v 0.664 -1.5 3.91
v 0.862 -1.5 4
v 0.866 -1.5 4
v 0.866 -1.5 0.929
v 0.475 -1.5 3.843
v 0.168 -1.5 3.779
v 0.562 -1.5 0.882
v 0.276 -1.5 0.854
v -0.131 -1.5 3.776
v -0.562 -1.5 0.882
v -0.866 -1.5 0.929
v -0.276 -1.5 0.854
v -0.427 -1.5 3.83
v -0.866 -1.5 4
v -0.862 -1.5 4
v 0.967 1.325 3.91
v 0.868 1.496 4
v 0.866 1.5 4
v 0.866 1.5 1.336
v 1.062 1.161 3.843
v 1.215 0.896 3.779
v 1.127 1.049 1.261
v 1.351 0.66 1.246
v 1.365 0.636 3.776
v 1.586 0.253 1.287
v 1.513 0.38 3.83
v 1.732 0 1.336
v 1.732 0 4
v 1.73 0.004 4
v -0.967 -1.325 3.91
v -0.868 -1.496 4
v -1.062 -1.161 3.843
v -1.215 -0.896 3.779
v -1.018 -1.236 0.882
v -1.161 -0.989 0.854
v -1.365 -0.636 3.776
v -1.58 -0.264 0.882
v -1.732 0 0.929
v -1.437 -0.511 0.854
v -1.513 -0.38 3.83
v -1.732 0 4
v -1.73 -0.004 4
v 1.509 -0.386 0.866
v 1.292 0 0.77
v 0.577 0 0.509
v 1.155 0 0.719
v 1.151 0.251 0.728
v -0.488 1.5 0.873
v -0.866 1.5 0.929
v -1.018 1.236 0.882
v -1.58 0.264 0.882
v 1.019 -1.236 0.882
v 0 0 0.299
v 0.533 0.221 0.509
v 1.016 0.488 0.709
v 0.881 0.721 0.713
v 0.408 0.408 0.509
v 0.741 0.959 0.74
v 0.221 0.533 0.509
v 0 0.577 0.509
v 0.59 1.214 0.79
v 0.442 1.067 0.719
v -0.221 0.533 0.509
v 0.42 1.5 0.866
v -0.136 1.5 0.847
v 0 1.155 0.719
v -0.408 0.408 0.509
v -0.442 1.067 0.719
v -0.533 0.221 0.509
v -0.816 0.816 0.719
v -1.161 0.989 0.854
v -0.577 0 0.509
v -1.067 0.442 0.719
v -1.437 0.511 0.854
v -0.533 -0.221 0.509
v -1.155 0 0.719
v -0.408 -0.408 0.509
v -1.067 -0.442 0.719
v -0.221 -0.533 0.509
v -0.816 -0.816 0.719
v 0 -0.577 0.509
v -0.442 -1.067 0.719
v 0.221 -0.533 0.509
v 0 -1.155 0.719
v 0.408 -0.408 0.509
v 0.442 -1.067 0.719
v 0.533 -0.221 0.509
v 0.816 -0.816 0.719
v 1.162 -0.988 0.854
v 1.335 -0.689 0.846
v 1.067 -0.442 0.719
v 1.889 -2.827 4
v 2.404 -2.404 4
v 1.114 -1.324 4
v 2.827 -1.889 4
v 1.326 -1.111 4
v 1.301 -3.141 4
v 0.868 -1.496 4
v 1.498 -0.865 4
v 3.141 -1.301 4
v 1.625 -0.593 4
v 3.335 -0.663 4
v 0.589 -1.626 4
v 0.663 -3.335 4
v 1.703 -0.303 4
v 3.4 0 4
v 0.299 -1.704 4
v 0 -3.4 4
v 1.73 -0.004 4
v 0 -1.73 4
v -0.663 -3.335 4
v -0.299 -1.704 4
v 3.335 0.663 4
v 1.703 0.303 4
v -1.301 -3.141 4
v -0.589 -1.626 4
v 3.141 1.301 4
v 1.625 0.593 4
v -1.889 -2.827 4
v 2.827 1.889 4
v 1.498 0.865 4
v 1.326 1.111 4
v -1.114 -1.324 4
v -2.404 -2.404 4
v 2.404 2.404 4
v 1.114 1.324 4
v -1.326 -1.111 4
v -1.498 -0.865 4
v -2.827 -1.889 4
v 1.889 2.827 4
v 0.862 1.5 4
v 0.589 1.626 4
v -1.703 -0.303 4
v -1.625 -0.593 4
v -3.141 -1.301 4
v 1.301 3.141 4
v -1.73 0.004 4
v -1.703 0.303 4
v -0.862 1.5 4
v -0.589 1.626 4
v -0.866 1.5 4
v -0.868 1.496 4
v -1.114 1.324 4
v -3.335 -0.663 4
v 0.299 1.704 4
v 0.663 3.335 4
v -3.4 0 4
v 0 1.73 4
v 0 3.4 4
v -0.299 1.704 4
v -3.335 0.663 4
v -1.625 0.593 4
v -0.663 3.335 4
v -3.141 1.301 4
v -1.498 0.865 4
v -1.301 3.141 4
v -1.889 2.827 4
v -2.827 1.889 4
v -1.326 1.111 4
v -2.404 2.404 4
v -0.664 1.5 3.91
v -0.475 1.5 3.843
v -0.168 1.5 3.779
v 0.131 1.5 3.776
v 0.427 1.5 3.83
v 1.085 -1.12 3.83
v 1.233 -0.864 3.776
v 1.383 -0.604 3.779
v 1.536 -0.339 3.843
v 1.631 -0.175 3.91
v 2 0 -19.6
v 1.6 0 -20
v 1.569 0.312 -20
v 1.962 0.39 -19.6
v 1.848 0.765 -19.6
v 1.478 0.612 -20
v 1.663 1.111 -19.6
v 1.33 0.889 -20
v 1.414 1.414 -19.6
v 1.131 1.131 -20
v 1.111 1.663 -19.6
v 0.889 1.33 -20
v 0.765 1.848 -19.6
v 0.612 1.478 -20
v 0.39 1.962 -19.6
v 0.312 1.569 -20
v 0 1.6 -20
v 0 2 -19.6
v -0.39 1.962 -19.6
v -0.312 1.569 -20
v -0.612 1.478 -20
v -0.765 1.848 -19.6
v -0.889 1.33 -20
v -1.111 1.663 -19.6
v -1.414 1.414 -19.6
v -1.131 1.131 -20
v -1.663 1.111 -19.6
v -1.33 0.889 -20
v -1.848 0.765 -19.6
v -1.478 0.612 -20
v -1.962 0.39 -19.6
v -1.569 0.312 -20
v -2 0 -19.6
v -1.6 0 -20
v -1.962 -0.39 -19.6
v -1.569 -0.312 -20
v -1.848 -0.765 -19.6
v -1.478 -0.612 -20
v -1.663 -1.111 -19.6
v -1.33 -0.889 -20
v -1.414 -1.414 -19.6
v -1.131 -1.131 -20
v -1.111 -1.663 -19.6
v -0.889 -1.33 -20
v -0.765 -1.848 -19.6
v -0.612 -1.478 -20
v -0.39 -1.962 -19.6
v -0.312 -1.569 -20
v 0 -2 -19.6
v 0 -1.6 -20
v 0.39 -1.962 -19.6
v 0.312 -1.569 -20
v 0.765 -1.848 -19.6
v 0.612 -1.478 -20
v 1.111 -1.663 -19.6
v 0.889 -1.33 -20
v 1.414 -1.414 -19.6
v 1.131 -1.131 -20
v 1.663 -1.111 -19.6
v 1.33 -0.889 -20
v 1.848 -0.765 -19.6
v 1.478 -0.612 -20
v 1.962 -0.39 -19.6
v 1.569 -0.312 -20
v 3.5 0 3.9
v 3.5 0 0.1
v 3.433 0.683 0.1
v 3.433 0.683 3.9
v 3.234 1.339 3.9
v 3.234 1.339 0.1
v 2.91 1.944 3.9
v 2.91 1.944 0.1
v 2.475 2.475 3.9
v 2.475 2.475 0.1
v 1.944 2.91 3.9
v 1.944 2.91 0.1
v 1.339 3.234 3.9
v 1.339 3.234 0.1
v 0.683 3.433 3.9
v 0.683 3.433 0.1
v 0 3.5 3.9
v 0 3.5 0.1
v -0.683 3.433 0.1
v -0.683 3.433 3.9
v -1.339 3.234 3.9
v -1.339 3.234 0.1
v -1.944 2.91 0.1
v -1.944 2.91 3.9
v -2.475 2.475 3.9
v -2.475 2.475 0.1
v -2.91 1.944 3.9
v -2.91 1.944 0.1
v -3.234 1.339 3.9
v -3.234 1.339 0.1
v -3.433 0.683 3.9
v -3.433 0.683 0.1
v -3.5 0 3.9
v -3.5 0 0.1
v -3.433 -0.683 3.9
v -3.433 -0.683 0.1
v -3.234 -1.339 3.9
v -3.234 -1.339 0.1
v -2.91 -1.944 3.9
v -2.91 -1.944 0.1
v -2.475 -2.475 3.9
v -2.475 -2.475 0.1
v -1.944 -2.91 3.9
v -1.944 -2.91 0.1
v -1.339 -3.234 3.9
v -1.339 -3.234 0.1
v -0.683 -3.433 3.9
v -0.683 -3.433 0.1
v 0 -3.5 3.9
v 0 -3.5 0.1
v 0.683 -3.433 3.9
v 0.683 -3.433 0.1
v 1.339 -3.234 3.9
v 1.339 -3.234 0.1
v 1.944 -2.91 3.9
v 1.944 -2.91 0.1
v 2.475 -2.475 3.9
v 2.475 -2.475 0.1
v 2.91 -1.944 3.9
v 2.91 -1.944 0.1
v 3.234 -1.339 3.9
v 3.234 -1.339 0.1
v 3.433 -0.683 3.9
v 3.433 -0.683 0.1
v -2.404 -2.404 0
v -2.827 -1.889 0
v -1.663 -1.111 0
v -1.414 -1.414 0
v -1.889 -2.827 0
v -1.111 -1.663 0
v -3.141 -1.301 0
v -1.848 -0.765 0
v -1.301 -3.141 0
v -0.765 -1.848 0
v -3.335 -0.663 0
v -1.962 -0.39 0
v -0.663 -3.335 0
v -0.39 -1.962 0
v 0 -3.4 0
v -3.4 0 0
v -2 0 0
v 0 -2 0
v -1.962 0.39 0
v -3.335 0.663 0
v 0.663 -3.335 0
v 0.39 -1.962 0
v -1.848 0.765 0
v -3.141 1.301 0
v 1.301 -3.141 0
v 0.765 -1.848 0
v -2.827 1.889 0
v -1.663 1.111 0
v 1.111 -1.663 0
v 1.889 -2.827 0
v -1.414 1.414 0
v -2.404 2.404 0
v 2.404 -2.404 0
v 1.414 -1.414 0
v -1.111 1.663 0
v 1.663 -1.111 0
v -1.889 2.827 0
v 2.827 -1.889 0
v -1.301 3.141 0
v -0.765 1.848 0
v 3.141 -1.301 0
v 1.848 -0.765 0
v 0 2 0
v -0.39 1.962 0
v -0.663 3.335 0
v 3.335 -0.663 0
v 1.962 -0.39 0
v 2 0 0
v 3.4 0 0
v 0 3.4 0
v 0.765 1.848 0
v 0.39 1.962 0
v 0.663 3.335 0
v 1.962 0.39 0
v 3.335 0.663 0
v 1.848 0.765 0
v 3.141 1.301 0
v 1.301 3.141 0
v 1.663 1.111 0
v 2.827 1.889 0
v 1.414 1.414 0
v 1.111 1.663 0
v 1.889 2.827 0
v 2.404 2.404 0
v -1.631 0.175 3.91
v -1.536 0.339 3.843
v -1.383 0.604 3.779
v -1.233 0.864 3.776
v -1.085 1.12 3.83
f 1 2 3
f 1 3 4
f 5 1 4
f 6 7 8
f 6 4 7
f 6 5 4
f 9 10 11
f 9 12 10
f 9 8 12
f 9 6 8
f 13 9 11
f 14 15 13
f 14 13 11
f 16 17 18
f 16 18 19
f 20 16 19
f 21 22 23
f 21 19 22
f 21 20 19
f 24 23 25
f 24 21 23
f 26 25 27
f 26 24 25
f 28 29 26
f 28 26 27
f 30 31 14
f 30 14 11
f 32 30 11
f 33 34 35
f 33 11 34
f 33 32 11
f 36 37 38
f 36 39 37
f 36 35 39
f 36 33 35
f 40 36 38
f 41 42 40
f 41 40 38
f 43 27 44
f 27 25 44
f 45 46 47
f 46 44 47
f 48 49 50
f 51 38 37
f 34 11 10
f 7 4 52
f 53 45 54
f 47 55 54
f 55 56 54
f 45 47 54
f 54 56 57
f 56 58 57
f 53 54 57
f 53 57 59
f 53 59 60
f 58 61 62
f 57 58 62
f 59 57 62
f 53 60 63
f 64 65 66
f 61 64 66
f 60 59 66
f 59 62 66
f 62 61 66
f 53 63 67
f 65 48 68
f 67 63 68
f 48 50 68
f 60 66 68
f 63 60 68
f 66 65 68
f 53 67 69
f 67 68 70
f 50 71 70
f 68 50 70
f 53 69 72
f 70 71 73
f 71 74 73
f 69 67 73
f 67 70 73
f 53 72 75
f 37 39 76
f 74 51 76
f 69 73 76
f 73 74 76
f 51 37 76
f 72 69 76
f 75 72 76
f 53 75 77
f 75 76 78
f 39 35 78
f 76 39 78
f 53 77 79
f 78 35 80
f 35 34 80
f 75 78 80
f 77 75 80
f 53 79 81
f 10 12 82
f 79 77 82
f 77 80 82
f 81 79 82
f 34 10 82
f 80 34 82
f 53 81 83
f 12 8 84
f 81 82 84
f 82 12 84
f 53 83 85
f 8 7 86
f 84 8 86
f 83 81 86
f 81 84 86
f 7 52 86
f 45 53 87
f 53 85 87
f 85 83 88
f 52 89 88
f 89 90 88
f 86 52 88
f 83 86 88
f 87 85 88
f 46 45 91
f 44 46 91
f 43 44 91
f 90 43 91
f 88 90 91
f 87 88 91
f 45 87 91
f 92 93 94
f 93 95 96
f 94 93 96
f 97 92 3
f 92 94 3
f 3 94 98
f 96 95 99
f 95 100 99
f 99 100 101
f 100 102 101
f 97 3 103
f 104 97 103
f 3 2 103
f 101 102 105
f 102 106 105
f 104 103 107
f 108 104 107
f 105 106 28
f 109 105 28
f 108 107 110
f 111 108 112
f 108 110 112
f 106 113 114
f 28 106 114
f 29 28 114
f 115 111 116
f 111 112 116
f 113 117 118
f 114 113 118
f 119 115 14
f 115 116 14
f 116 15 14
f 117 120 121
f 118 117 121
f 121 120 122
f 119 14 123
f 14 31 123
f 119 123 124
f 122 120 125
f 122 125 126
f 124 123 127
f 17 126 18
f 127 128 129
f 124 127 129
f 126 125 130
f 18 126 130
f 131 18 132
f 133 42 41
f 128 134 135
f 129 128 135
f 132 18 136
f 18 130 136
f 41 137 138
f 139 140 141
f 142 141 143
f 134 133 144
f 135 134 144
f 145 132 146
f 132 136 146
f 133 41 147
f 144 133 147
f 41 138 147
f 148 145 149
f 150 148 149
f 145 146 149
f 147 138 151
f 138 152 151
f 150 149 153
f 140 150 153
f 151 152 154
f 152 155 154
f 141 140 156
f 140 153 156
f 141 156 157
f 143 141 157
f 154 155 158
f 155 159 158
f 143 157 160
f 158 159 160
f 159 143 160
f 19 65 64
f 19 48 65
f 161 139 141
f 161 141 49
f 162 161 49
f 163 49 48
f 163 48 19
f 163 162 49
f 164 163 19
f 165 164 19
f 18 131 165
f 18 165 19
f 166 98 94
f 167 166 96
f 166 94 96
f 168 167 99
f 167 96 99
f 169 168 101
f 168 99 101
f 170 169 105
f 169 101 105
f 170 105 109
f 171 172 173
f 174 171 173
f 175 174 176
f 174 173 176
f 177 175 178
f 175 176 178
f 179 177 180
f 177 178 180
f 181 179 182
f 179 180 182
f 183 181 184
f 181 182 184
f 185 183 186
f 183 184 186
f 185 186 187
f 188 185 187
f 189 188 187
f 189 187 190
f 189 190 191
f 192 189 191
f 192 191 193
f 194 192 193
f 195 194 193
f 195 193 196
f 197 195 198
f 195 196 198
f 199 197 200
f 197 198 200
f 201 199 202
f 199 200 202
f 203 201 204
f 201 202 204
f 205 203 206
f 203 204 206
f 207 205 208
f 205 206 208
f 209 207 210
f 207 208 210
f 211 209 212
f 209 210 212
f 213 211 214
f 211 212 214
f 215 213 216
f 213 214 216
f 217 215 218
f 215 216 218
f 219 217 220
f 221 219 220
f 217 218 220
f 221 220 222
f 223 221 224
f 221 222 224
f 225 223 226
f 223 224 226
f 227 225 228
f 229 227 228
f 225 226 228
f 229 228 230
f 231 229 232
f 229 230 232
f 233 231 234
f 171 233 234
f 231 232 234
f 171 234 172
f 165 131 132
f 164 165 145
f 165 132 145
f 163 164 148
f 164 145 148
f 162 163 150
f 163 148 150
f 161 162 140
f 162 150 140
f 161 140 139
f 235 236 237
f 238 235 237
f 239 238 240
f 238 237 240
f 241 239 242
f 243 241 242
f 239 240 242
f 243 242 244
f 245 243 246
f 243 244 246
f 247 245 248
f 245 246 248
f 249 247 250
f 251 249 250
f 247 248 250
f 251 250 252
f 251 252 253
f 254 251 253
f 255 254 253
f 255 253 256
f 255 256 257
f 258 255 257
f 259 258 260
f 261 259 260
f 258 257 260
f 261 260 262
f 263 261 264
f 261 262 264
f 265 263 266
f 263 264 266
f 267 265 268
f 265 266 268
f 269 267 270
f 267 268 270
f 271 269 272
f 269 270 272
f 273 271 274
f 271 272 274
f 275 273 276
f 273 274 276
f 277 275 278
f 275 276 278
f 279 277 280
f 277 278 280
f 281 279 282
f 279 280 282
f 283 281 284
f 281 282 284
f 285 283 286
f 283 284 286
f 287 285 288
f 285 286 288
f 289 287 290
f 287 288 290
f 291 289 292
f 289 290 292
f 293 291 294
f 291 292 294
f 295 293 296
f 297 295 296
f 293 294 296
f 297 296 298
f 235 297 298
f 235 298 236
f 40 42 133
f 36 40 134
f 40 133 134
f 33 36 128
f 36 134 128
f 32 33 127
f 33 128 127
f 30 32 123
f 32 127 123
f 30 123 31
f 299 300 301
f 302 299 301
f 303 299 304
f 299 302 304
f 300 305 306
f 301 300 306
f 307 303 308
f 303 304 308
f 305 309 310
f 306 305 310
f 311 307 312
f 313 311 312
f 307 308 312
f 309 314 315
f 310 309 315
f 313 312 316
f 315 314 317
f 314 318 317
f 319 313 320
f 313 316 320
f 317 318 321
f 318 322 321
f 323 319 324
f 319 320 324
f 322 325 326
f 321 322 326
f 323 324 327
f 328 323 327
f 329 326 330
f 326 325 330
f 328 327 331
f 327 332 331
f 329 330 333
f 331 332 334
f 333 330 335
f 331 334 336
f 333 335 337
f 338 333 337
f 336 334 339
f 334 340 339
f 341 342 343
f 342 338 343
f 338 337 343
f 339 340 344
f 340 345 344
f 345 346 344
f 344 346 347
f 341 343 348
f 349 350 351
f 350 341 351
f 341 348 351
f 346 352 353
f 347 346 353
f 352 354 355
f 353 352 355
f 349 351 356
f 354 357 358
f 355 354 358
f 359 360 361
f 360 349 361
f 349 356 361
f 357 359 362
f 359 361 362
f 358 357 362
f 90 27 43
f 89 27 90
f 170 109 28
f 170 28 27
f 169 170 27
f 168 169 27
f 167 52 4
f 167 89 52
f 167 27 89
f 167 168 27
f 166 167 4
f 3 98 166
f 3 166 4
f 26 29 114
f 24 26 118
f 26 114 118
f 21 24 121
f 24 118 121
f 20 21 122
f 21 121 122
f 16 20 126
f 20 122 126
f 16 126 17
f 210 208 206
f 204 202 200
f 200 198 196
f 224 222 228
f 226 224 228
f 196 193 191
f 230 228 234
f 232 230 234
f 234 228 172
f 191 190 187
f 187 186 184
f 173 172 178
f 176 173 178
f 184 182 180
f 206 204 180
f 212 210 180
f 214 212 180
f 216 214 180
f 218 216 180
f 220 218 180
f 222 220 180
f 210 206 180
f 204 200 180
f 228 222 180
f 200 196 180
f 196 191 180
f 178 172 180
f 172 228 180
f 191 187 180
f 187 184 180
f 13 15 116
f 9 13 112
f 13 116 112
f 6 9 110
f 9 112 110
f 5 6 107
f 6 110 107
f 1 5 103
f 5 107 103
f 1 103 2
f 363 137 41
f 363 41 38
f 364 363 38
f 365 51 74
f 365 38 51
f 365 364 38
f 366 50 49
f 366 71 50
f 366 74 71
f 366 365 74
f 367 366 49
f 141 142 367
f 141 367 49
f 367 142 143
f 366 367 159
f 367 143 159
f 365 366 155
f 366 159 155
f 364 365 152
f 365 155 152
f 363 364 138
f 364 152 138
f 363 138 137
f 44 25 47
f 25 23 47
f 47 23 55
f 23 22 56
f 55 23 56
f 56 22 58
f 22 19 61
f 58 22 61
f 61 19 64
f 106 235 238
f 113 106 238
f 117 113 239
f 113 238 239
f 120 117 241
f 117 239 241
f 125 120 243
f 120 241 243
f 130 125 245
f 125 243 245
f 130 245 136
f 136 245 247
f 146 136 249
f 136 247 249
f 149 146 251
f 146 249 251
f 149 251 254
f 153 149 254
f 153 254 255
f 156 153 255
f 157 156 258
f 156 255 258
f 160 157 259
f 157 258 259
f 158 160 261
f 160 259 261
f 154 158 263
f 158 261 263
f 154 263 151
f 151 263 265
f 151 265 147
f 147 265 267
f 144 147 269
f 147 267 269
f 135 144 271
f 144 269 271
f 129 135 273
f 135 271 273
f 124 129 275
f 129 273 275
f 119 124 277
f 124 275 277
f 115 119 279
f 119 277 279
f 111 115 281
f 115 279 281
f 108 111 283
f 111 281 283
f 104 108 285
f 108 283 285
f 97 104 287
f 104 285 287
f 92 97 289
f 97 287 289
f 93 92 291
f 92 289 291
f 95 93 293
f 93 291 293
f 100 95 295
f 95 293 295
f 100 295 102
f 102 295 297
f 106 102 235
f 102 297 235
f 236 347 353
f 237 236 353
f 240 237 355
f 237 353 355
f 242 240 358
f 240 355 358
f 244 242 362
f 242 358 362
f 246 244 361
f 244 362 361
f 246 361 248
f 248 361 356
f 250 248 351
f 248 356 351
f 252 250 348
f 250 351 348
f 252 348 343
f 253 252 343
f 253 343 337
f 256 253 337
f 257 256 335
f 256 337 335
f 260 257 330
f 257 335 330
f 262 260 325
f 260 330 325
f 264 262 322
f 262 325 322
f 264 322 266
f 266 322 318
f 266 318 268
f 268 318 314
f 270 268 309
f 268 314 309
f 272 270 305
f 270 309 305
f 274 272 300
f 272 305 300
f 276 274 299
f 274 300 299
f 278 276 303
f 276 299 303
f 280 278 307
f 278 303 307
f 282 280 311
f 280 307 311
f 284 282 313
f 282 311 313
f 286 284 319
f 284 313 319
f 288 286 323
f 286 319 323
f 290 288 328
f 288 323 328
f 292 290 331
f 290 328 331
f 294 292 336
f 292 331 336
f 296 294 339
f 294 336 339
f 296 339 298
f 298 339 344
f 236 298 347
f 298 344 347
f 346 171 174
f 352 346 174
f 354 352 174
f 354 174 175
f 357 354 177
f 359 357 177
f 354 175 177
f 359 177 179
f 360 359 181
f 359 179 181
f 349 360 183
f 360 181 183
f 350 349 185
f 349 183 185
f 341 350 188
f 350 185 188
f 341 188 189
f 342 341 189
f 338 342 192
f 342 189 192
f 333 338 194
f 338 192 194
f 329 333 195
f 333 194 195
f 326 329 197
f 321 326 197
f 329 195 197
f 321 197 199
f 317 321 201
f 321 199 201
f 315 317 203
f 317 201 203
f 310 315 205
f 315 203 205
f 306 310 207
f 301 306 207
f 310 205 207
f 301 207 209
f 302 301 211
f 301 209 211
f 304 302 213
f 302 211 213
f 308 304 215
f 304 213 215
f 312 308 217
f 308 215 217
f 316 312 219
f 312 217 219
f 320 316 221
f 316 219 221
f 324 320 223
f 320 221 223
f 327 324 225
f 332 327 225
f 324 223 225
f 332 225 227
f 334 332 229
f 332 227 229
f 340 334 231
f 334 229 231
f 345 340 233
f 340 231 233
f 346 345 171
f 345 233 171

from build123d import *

# Parameters (mm, degrees)
SKETCH001_R     = 3.75
POCKET_DEPTH    = 9.70192
CHAMFER_SIZE    = 0.4
CHAMFER001_SIZE = 0.1
CHAMFER002_SIZE = 0.4


with BuildPart() as pocket:
    # Sketch003 → Revolution001 (revolve)
    with BuildSketch(Plane.XZ):
        Polygon((0, 0.29908), (2.75, 1.3), (2.75, 10), (0, 10), align=None)
    revolve(axis=Axis((0, 0, 0), (0, 0, 1)))

    # Sketch001 → Pocket (cut, through all)
    with BuildSketch(Plane(origin=(0, 0, 10), x_dir=(-1, 0, 0), z_dir=(0, 0, 1))):
        Circle(SKETCH001_R)
        Polygon((-0.866025, 1.5), (0.866025, 1.5), (1.732051, 0), (0.866025, -1.5), (-0.866025, -1.5), (-1.732051, 0), align=None, mode=Mode.SUBTRACT)
    extrude(amount=-POCKET_DEPTH, mode=Mode.SUBTRACT)


with BuildPart() as chamfer002:
    # Sketch → Revolution (revolve)
    with BuildSketch(Plane.XZ):
        Polygon((1.73, 4), (3.5, 4), (3.5, 0), (2, 0), (2, -20), (0, -20), (0, 2.269998), align=None)
    revolve(axis=Axis((0, 0, 0), (0, 0, 1)))

    # Cut: cut Pocket
    add(pocket.part, mode=Mode.SUBTRACT)

    # Chamfer
    chamfer_edges = [chamfer002.edges().sort_by_distance(p)[0] for p in [
        (1.299038, 0.75, 0.845037),
    ]]
    chamfer(chamfer_edges, length=CHAMFER_SIZE)

    # Chamfer001
    chamfer001_edges = [chamfer002.edges().sort_by_distance(p)[0] for p in [
        (-3.5, 0, 4),
        (-3.5, 0, 0),
    ]]
    chamfer(chamfer001_edges, length=CHAMFER001_SIZE)

    # Chamfer002
    chamfer002_edges = [chamfer002.edges().sort_by_distance(p)[0] for p in [
        (-2, 0, -20),
    ]]
    chamfer(chamfer002_edges, length=CHAMFER002_SIZE)


solid = chamfer002.part
